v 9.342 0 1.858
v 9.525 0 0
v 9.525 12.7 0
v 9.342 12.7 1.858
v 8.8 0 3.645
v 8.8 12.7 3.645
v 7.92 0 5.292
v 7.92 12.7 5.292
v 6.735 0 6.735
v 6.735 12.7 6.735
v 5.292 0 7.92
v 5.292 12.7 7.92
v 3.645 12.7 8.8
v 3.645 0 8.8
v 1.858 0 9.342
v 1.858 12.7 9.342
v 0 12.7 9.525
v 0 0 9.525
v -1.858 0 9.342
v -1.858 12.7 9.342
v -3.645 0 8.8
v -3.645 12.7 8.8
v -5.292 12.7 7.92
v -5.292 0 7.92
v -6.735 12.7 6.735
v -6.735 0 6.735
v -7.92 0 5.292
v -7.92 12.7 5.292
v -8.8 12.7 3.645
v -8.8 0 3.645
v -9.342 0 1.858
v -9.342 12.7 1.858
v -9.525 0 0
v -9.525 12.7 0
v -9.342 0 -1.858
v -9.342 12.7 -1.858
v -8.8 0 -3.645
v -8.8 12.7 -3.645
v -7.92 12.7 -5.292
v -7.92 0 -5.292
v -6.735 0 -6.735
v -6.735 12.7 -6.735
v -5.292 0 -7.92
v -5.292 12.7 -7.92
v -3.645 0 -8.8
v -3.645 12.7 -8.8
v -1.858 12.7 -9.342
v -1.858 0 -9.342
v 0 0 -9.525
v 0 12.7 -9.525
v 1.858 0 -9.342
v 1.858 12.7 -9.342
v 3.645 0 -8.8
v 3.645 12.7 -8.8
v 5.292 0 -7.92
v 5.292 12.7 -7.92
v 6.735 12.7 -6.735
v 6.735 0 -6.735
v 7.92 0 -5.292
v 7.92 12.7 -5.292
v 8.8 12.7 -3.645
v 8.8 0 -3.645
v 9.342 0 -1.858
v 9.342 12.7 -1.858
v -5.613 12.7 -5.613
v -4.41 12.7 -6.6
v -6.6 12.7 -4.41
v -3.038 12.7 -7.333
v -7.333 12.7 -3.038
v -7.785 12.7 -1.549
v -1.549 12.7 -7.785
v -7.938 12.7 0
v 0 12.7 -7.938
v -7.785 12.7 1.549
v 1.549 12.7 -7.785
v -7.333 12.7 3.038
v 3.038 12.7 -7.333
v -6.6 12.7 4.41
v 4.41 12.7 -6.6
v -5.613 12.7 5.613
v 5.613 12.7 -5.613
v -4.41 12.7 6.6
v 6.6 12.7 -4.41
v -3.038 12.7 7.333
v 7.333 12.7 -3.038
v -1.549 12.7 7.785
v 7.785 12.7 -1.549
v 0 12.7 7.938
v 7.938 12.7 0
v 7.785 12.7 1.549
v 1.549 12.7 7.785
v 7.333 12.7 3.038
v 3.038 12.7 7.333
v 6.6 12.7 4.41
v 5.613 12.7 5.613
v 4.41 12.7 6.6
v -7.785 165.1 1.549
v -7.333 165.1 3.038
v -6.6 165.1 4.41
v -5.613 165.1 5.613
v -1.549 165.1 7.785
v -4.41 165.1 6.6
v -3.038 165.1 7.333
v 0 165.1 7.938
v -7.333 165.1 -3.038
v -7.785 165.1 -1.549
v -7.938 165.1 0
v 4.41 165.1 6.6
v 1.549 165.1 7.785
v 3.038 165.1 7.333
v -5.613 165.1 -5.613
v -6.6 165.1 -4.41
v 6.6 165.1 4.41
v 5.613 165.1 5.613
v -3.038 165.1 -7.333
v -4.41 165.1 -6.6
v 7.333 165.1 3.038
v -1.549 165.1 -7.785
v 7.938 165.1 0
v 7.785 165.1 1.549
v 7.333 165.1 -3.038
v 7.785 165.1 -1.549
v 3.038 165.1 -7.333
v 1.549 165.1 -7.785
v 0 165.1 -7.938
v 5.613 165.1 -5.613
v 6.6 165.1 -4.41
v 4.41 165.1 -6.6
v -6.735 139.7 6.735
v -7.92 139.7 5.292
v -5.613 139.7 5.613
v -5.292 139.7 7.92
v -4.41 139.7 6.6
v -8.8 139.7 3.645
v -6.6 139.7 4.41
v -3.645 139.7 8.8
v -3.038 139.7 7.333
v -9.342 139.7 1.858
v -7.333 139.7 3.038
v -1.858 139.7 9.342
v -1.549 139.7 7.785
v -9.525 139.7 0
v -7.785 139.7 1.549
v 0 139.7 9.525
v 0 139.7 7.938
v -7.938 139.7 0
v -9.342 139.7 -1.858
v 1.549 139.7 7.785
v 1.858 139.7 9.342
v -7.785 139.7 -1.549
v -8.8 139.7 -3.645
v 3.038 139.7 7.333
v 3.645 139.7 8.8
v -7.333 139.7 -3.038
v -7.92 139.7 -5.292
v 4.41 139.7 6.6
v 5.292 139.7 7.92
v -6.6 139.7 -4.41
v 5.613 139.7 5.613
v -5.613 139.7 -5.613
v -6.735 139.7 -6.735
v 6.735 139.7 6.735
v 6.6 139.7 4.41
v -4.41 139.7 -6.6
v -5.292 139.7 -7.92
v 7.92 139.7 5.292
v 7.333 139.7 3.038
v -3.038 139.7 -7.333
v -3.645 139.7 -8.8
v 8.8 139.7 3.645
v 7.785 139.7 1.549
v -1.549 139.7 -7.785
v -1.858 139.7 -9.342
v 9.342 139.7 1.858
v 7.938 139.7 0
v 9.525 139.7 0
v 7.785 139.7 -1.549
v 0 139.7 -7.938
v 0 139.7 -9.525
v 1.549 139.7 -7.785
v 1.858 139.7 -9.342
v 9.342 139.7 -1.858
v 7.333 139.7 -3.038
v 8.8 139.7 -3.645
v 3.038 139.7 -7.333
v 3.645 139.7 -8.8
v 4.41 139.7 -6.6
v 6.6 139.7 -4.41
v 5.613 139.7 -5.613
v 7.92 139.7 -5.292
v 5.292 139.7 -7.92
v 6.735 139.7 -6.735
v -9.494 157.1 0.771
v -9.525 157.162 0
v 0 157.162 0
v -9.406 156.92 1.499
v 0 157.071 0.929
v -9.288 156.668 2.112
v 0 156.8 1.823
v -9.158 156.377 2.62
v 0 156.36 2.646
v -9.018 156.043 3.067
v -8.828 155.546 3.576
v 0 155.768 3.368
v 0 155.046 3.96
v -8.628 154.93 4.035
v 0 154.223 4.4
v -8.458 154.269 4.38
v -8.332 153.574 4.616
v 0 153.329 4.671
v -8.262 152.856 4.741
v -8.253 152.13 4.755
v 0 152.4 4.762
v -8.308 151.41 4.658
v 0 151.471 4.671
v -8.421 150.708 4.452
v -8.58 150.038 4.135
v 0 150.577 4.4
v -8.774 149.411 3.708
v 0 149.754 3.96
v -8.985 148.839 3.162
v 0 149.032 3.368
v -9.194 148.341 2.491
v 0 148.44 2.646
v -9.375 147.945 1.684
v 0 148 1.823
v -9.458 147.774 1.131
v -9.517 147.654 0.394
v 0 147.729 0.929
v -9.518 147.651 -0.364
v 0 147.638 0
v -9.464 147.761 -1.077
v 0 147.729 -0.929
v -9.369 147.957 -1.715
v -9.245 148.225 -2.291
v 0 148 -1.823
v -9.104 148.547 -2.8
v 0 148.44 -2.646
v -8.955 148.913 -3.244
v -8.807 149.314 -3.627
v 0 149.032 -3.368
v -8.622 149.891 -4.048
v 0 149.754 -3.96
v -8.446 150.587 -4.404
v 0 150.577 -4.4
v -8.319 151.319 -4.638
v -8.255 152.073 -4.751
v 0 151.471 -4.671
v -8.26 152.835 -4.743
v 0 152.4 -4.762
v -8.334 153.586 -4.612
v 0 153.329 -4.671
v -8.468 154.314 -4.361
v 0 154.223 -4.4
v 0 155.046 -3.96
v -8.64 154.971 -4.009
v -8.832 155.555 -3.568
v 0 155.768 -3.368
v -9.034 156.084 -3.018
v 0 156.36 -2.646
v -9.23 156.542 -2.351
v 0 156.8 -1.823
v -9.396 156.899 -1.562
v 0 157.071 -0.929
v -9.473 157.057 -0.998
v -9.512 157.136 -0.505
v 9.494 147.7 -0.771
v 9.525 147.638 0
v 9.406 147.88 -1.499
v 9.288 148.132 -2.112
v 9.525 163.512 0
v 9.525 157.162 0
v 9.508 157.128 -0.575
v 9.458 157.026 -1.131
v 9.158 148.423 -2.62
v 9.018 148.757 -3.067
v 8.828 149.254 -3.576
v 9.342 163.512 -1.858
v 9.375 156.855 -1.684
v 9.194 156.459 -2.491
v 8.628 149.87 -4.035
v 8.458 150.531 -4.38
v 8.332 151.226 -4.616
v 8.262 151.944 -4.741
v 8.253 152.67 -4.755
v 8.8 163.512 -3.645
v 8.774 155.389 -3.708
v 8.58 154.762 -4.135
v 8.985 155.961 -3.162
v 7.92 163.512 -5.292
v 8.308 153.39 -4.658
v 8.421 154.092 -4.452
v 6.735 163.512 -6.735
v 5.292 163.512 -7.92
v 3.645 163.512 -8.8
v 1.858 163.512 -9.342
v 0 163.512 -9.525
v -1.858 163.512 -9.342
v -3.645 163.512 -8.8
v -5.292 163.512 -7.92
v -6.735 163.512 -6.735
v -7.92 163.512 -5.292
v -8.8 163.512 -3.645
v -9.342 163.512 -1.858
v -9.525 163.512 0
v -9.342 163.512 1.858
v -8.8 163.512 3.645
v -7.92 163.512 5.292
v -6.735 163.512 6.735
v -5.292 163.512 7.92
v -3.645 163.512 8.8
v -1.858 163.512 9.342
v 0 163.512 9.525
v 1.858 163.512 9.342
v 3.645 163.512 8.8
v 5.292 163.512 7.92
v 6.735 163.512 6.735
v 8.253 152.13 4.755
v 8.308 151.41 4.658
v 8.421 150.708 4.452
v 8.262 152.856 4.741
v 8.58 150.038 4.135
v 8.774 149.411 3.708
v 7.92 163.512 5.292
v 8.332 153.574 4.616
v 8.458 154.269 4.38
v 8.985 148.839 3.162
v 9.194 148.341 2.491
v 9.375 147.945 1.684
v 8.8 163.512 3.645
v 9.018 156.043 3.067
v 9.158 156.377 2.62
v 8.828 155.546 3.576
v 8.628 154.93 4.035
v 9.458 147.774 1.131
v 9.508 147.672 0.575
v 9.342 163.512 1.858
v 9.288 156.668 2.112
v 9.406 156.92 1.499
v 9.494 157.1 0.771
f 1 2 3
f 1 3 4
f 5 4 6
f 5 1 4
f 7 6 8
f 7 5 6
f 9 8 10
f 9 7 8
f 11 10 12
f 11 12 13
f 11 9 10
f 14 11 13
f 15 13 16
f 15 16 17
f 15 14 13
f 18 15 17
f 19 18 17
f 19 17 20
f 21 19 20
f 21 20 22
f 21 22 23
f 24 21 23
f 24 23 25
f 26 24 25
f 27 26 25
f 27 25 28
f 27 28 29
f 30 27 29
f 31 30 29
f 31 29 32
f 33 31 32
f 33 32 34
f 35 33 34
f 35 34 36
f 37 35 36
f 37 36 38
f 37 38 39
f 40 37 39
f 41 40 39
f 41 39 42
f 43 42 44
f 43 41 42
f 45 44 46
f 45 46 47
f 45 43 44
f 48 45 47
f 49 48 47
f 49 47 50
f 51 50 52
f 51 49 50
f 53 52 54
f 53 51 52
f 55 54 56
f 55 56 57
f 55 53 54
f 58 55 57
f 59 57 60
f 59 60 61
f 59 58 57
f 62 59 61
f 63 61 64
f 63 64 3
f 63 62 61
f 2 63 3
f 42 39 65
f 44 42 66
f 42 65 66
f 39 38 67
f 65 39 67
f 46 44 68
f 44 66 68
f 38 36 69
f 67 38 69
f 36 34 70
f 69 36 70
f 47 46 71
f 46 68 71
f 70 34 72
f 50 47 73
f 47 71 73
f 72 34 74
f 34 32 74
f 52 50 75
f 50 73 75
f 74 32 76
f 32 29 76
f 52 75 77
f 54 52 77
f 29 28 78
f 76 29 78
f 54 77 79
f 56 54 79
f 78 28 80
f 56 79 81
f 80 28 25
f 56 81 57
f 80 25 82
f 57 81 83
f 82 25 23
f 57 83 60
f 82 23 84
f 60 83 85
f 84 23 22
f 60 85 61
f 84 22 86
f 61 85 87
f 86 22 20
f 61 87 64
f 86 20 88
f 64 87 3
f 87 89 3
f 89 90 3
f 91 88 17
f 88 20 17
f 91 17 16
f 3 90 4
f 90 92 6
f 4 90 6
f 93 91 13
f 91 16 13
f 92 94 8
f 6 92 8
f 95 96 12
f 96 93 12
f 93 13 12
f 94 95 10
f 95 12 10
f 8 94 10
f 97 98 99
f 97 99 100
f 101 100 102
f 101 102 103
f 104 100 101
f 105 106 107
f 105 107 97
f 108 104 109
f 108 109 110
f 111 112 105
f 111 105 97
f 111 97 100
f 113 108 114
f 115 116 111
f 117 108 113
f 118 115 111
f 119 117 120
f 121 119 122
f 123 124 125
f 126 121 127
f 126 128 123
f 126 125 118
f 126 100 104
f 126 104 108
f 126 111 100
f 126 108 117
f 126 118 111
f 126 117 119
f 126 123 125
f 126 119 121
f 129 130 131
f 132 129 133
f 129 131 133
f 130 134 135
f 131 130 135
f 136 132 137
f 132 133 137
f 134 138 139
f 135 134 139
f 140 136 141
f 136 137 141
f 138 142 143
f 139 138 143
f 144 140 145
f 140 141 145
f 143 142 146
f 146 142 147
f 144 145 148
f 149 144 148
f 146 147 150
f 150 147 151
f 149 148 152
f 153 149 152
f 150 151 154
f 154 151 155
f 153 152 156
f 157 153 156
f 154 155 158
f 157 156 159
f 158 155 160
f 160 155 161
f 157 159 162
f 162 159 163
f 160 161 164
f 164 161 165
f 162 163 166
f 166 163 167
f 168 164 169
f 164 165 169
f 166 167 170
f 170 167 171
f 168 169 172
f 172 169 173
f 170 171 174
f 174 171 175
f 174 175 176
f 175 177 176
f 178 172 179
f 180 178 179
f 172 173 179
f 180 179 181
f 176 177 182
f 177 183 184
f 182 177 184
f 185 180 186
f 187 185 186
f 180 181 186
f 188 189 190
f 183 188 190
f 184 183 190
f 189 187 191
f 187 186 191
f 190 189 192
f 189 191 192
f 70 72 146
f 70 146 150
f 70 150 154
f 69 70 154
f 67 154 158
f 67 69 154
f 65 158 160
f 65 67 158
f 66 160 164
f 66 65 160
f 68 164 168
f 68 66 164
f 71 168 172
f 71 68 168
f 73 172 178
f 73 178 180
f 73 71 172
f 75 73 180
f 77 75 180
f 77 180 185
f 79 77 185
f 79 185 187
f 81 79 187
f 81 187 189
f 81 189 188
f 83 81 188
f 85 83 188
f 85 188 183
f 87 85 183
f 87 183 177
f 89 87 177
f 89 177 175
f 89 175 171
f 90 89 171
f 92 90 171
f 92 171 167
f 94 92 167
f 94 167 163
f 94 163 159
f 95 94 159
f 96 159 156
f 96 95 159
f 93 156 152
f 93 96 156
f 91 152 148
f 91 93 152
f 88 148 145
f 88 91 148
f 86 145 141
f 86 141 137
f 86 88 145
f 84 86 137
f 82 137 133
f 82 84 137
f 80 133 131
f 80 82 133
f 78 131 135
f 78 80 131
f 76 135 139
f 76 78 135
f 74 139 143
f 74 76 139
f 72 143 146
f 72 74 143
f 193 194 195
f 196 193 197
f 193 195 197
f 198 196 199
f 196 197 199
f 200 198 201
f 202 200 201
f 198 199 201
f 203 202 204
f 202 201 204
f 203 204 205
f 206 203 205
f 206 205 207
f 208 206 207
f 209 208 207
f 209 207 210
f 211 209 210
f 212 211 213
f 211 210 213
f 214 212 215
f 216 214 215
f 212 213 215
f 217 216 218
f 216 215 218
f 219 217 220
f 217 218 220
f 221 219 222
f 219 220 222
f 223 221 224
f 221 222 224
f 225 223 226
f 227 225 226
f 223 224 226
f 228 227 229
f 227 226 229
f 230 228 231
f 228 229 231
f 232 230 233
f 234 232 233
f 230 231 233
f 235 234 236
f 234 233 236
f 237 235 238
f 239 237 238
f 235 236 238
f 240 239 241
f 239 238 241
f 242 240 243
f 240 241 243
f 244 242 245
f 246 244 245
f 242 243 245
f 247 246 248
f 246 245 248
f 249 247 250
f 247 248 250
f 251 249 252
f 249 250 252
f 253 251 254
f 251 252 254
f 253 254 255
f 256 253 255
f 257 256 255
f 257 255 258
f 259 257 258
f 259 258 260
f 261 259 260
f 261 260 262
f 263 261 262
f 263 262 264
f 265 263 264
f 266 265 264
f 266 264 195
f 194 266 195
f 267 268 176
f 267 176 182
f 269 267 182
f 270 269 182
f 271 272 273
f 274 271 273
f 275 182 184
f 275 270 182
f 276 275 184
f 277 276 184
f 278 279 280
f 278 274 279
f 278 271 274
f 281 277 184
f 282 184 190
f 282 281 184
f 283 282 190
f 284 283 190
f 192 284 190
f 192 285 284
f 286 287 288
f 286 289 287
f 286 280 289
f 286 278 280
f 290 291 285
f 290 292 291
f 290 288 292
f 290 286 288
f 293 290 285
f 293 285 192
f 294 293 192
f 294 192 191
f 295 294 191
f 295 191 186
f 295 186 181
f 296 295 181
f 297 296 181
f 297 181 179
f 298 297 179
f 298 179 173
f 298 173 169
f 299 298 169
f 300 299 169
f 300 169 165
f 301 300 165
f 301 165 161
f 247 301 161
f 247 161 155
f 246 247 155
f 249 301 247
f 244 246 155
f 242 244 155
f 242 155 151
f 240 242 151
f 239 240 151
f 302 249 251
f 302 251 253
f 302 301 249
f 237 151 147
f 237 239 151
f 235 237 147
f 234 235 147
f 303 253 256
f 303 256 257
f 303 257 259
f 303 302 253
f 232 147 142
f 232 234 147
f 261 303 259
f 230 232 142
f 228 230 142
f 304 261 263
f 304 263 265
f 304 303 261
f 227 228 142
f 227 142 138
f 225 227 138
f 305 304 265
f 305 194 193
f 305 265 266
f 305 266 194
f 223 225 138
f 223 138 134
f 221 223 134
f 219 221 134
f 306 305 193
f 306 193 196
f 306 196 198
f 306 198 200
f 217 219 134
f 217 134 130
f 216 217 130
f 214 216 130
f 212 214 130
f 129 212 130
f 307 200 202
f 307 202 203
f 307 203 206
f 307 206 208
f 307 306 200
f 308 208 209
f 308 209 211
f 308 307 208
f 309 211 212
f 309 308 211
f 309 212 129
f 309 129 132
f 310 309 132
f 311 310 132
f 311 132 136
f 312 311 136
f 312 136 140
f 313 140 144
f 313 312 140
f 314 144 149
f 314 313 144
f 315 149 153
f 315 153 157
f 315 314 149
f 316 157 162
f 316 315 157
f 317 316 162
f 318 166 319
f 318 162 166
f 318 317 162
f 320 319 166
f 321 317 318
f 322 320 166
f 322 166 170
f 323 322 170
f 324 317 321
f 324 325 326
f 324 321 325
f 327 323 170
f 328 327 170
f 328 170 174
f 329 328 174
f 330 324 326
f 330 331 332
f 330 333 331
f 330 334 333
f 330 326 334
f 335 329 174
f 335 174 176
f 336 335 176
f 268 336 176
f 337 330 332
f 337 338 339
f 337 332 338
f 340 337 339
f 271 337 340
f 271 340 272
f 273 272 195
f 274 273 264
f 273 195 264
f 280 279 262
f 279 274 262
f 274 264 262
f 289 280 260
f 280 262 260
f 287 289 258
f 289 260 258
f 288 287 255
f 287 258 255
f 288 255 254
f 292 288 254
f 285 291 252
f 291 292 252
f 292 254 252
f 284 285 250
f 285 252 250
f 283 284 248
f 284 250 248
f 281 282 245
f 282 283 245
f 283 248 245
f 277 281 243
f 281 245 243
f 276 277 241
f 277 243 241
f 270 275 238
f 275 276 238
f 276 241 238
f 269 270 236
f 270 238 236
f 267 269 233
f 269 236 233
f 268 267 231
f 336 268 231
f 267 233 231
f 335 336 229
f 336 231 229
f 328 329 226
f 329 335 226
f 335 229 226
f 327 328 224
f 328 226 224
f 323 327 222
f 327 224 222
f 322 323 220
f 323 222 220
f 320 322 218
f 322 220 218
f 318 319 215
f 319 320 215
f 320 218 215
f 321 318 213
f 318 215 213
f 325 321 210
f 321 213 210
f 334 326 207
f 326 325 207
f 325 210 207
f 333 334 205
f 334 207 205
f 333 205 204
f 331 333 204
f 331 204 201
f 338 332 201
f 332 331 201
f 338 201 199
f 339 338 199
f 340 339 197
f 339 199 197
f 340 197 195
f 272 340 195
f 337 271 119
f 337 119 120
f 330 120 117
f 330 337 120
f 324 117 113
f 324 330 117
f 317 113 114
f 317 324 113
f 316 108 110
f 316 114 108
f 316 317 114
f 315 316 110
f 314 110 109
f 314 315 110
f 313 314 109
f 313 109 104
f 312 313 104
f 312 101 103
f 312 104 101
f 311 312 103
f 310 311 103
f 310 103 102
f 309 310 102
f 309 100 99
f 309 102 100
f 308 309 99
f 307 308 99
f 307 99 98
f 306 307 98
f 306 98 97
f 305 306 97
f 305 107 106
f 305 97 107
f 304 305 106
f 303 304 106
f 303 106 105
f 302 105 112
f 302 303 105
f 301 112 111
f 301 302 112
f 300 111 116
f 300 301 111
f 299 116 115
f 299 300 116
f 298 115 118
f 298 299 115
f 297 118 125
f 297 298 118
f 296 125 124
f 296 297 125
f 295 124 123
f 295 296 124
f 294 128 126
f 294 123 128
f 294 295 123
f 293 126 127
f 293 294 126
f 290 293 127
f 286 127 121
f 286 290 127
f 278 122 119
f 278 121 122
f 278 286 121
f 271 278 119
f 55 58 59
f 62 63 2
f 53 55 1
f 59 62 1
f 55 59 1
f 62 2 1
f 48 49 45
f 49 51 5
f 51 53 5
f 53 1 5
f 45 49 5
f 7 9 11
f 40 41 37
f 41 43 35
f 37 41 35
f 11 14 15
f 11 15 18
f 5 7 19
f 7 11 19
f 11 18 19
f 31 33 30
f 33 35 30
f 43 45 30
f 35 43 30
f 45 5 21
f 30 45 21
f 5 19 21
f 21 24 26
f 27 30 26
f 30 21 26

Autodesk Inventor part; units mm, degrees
ref_plane "YZ Plane" through (0, 0, 0) normal (1, 0, 0) x (0, 1, 0)
ref_plane "XZ Plane" through (0, 0, 0) normal (0, 1, 0) x (-1, 0, 0)
ref_plane "XY Plane" through (0, 0, 0) normal (0, 0, 1) x (1, 0, 0)
sketch "Boceto1" plane through (0, 0, 0) normal (0, 1, 0) x (-1, 0, 0)
  circle A0 centre (0, 0) radius 7.9375
  dimension "d0" = 15.875
extrude "Extrusión1" add sketch "Boceto1" along normal blind 165.1
sketch "Boceto2" plane through (0, 0, 0) normal (0, -1, 0) x (1, 0, 0)
  circle A0 centre (0, 0) radius 9.525
  dimension "d3" = 19.05
extrude "Extrusión2" add sketch "Boceto2" against normal blind 12.7
sketch "Boceto3" plane through (0, 165.1, 0) normal (0, 1, 0) x (1, 0, 0)
  circle A0 centre (0, 0) radius 9.525
  dimension "d6" = 19.05
extrude "Extrusión3" add sketch "Boceto3" against normal blind 25.4
chamfer "Chaflán1" distance 1.5875 angle 45 1 edges at (-9.525, 165.1, 0) measured on face at (0.831, 165.1, 0.7598)
sketch "Boceto4" plane through (0, 0, 0) normal (1, 0, 0) x (0, 1, 0)
  line L0 (165.1, 7.9375) -> (165.1, -7.9375) projected
  line L1 (165.1, 0) -> (139.7, 0)
  line L2 (139.7, 9.525) -> (139.7, -9.525) projected
  circle A0 centre (152.4, 0) radius 4.7625
  point P0 (0, 0)
  dimension "d12" = 9.525
extrude "Extrusión4" cut sketch "Boceto4" along normal mid plane 25.4
properties part number "Pieza7-Tarea1"
